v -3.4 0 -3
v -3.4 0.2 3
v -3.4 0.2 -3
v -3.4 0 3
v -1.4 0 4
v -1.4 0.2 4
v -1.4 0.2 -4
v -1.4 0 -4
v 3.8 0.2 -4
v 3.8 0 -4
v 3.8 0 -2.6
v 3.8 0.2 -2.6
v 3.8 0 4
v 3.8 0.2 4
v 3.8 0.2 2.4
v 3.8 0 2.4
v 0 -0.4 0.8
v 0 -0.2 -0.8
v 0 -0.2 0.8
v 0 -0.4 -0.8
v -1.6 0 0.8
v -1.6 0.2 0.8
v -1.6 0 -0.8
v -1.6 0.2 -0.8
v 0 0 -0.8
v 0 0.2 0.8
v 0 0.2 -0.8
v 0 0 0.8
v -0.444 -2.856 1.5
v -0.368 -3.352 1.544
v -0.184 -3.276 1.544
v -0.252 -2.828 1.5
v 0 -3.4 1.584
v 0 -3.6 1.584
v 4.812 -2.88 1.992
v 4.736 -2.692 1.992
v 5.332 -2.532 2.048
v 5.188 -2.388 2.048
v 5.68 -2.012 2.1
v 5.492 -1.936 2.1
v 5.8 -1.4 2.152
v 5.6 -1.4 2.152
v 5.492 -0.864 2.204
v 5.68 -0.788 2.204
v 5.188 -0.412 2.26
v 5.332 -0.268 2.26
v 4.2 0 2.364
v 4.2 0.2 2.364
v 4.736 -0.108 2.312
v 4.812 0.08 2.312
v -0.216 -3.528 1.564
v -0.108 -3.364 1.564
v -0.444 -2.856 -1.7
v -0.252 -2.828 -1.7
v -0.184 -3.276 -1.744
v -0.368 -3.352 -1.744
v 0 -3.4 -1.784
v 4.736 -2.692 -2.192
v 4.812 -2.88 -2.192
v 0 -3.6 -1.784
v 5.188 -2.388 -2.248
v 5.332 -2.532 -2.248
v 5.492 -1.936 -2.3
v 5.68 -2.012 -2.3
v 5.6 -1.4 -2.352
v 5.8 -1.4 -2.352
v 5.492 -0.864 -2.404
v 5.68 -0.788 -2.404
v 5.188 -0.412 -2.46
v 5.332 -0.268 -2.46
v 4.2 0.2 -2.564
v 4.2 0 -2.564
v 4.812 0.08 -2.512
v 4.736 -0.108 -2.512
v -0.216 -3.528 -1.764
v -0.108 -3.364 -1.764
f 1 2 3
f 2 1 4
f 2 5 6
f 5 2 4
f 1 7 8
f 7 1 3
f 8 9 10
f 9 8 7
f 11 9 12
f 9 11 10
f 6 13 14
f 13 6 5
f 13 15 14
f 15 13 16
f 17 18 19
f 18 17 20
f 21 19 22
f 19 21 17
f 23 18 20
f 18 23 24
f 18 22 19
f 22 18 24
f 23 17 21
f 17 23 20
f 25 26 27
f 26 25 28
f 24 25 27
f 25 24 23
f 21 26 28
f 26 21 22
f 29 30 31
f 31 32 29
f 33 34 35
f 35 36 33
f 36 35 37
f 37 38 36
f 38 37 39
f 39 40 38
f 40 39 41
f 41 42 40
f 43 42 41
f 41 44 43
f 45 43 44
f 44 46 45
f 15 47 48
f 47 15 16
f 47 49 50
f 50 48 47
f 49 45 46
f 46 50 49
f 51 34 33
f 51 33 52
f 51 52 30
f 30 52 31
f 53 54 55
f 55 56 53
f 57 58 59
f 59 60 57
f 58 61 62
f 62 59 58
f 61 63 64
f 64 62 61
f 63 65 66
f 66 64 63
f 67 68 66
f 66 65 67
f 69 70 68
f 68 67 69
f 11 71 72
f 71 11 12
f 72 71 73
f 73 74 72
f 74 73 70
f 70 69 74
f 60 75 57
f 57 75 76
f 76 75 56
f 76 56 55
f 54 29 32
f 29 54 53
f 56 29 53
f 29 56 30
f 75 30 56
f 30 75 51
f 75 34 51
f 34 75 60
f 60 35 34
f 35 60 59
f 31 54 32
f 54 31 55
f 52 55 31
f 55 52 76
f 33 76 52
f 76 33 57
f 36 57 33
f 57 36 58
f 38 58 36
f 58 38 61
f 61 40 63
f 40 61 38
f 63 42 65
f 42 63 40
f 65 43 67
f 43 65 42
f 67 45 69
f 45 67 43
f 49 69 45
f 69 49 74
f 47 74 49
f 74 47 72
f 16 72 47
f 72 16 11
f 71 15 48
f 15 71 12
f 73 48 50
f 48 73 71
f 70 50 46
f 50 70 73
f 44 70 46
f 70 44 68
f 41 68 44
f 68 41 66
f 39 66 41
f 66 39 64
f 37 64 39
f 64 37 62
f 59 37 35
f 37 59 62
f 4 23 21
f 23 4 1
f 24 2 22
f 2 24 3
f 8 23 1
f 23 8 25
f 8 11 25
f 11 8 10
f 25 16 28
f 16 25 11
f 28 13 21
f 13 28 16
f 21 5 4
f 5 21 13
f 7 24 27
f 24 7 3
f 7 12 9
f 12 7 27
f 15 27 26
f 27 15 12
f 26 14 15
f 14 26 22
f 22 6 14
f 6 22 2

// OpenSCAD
// file: ../p/rect.scad
use <../lib.scad>
function ldraw_lib__rect() = [
// 0 Rectangle
// 0 Name: rect.dat
// 0 Author: James Jessiman
// 0 !LDRAW_ORG Primitive UPDATE 2010-01
// 0 !LICENSE Licensed under CC BY 4.0 : see CAreadme.txt
// 
// 0 BFC CERTIFY CCW
  [0,"BFC","CERTIFY"],
  [0,"BFC","CCW"],
// 
// 0 !HISTORY 2002-04-05 [hafhead] Added BFC statement
// 0 !HISTORY 2002-04-25 [PTadmin] Official Update 2002-02
// 0 !HISTORY 2007-06-24 [PTadmin] Header formatted for Contributor Agreement
// 0 !HISTORY 2008-07-01 [PTadmin] Official Update 2008-01
// 0 !HISTORY 2010-01-17 [mikeheide] changed winding to CCW
// 0 !HISTORY 2010-04-05 [PTadmin] Official Update 2010-01
// 
// 
// 2 24 1 0 1 -1 0 1
  [2,24,1,0,1,-1,0,1],
// 2 24 -1 0 1 -1 0 -1
  [2,24,-1,0,1,-1,0,-1],
// 2 24 -1 0 -1 1 0 -1
  [2,24,-1,0,-1,1,0,-1],
// 2 24 1 0 -1 1 0 1
  [2,24,1,0,-1,1,0,1],
// 4 16 -1 0 1 -1 0 -1 1 0 -1 1 0 1
  [4,16,-1,0,1,-1,0,-1,1,0,-1,1,0,1],
// 0
];
module ldraw_lib__rect(step=0, col=false, unit=2/5, alt=false, line=0.2, solid=!$preview)
    makepoly(ldraw_lib__rect(), step=step, col=col, unit=unit, alt=alt, line=line, solid=solid);
ldraw_lib__rect(line=0.2);
// file: ../p/box5-2p.scad
use <../lib.scad>
function ldraw_lib__box5_2p() = [
// 0 Box with  5 Faces without  2 Parallel Edges
// 0 Name: box5-2p.dat
// 0 Author: Willy Tschager [Holly-Wood]
// 0 !LDRAW_ORG Primitive UPDATE 2024-01
// 0 !LICENSE Licensed under CC BY 4.0 : see CAreadme.txt
// 
// 0 BFC CERTIFY CCW
  [0,"BFC","CERTIFY"],
  [0,"BFC","CCW"],
// 
// 0 !HISTORY 2012-03-30 [PTadmin] Official Update 2012-01
// 0 !HISTORY 2024-01-04 [Holly-Wood] Complete re-write, original by Brickaneer
// 0 !HISTORY 2024-01-29 [OrionP] Official Update 2024-01
// 
// 2 24 -1 1 1 1 1 1
  [2,24,-1,1,1,1,1,1],
// 2 24 -1 1 -1 -1 1 1
  [2,24,-1,1,-1,-1,1,1],
// 2 24 1 1 -1 -1 1 -1
  [2,24,1,1,-1,-1,1,-1],
// 2 24 1 1 1 1 1 -1
  [2,24,1,1,1,1,1,-1],
// 4 16 1 1 1 1 1 -1 -1 1 -1 -1 1 1
  [4,16,1,1,1,1,1,-1,-1,1,-1,-1,1,1],
// 
// 2 24 -1 1 1 -1 0 1
  [2,24,-1,1,1,-1,0,1],
// 2 24 -1 1 -1 -1 0 -1
  [2,24,-1,1,-1,-1,0,-1],
// 2 24 -1 0 -1 -1 0 1
  [2,24,-1,0,-1,-1,0,1],
// 4 16 -1 1 1 -1 1 -1 -1 0 -1 -1 0 1
  [4,16,-1,1,1,-1,1,-1,-1,0,-1,-1,0,1],
// 
// 2 24 1 1 1 1 0 1
  [2,24,1,1,1,1,0,1],
// 2 24 1 1 -1 1 0 -1
  [2,24,1,1,-1,1,0,-1],
// 2 24 1 0 1 1 0 -1
  [2,24,1,0,1,1,0,-1],
// 4 16 1 1 -1 1 1 1 1 0 1 1 0 -1
  [4,16,1,1,-1,1,1,1,1,0,1,1,0,-1],
// 
// 4 16 1 1 1 -1 1 1 -1 0 1 1 0 1
  [4,16,1,1,1,-1,1,1,-1,0,1,1,0,1],
// 4 16 -1 1 -1 1 1 -1 1 0 -1 -1 0 -1
  [4,16,-1,1,-1,1,1,-1,1,0,-1,-1,0,-1],
];
module ldraw_lib__box5_2p(step=0, col=false, unit=2/5, alt=false, line=0.2, solid=!$preview)
    makepoly(ldraw_lib__box5_2p(), step=step, col=col, unit=unit, alt=alt, line=line, solid=solid);
ldraw_lib__box5_2p(line=0.2);
// file: ../p/box3u4a.scad
use <../lib.scad>
function ldraw_lib__box3u4a() = [
// 0 Box with 3 Faces without 4 Adjacent Edges
// 0 Name: box3u4a.dat
// 0 Author: Niels Karsdorp [nielsk]
// 0 !LDRAW_ORG Primitive UPDATE 2009-01
// 0 !LICENSE Licensed under CC BY 4.0 : see CAreadme.txt
// 
// 0 BFC CERTIFY CCW
  [0,"BFC","CERTIFY"],
  [0,"BFC","CCW"],
// 
// 0 !HISTORY 2009-05-02 [PTadmin] Official Update 2009-01
// 
// 
// 2 24 1 1 1 -1 1 1
  [2,24,1,1,1,-1,1,1],
// 2 24 -1 1 -1 1 1 -1
  [2,24,-1,1,-1,1,1,-1],
// 2 24 1 1 1 1 1 -1
  [2,24,1,1,1,1,1,-1],
// 2 24 -1 1 1 -1 1 -1
  [2,24,-1,1,1,-1,1,-1],
// 2 24 1 1 1 1 0 1
  [2,24,1,1,1,1,0,1],
// 2 24 1 1 -1 1 0 -1
  [2,24,1,1,-1,1,0,-1],
// 2 24 -1 1 1 -1 0 1
  [2,24,-1,1,1,-1,0,1],
// 2 24 -1 1 -1 -1 0 -1
  [2,24,-1,1,-1,-1,0,-1],
// 4 16 -1 1 -1 -1 1 1 1 1 1 1 1 -1
  [4,16,-1,1,-1,-1,1,1,1,1,1,1,1,-1],
// 4 16 -1 1 1 -1 0 1 1 0 1 1 1 1
  [4,16,-1,1,1,-1,0,1,1,0,1,1,1,1],
// 4 16 1 1 -1 1 0 -1 -1 0 -1 -1 1 -1
  [4,16,1,1,-1,1,0,-1,-1,0,-1,-1,1,-1],
// 0
];
module ldraw_lib__box3u4a(step=0, col=false, unit=2/5, alt=false, line=0.2, solid=!$preview)
    makepoly(ldraw_lib__box3u4a(), step=step, col=col, unit=unit, alt=alt, line=line, solid=solid);
ldraw_lib__box3u4a(line=0.2);
// file: ../p/box2-5.scad
use <../lib.scad>
function ldraw_lib__box2_5() = [
// 0 Box with 2 Faces without 5 Edges
// 0 Name: box2-5.dat
// 0 Author: Steffen [Steffen]
// 0 !LDRAW_ORG Primitive UPDATE 2003-03
// 0 !LICENSE Licensed under CC BY 4.0 : see CAreadme.txt
// 
// 0 BFC CERTIFY CCW
  [0,"BFC","CERTIFY"],
  [0,"BFC","CCW"],
// 
// 0 !HISTORY 2003-12-19 [PTadmin] Official Update 2003-03
// 0 !HISTORY 2007-06-24 [PTadmin] Header formatted for Contributor Agreement
// 0 !HISTORY 2008-07-01 [PTadmin] Official Update 2008-01
// 
// 
// 2 24 1 1 1 -1 1 1
  [2,24,1,1,1,-1,1,1],
// 2 24 1 1 -1 -1 1 -1
  [2,24,1,1,-1,-1,1,-1],
// 2 24 1 -1 1 -1 -1 1
  [2,24,1,-1,1,-1,-1,1],
// 2 24 -1 -1 1 -1 1 1
  [2,24,-1,-1,1,-1,1,1],
// 2 24 1 -1 1 1 1 1
  [2,24,1,-1,1,1,1,1],
// 2 24 -1 1 -1 -1 1 1
  [2,24,-1,1,-1,-1,1,1],
// 2 24 1 1 -1 1 1 1
  [2,24,1,1,-1,1,1,1],
// 4 16 1 1 1 1 1 -1 -1 1 -1 -1 1 1
  [4,16,1,1,1,1,1,-1,-1,1,-1,-1,1,1],
// 4 16 1 1 1 -1 1 1 -1 -1 1 1 -1 1
  [4,16,1,1,1,-1,1,1,-1,-1,1,1,-1,1],
// 0
];
module ldraw_lib__box2_5(step=0, col=false, unit=2/5, alt=false, line=0.2, solid=!$preview)
    makepoly(ldraw_lib__box2_5(), step=step, col=col, unit=unit, alt=alt, line=line, solid=solid);
ldraw_lib__box2_5(line=0.2);
// main file
use <../lib.scad>
use <../p/box2-5.scad>
use <../p/box3u4a.scad>
use <../p/box5-2p.scad>
use <../p/rect.scad>
function ldraw_lib__u9642() = [
// 0 ~Electric 9V Battery Box  4 x 14 x  4 Bottom - Contact Short
// 0 Name: u9642.dat
// 0 Author: Gerald Lasser [GeraldLasser]
// 0 !LDRAW_ORG Part UPDATE 2024-08
// 0 !LICENSE Licensed under CC BY 4.0 : see CAreadme.txt
// 
// 0 BFC CERTIFY CCW
  [0,"BFC","CERTIFY"],
  [0,"BFC","CCW"],
// 
// 0 !HISTORY 2024-09-30 [OrionP] Official Update 2024-08
// 
// 1 16 -8.5 0 .25 0 1 0 0 0 7.5 .25 0 0 rect.dat
  [1,16,-8.5,0,.25,0,1,0,0,0,7.5,.25,0,0, ldraw_lib__rect()],
// 4 16 -3.5 -10 0 -3.5 -10 .5 -8.5 -7.5 .5 -8.5 -7.5 0
  [4,16,-3.5,-10,0,-3.5,-10,.5,-8.5,-7.5,.5,-8.5,-7.5,0],
// 4 16 -8.5 7.5 .5 -3.5 10 .5 -3.5 10 0 -8.5 7.5 0
  [4,16,-8.5,7.5,.5,-3.5,10,.5,-3.5,10,0,-8.5,7.5,0],
// 2 24 -3.5 -10 0 -8.5 -7.5 0
  [2,24,-3.5,-10,0,-8.5,-7.5,0],
// 2 24 -8.5 -7.5 .5 -3.5 -10 .5
  [2,24,-8.5,-7.5,.5,-3.5,-10,.5],
// 2 24 -8.5 7.5 .5 -3.5 10 .5
  [2,24,-8.5,7.5,.5,-3.5,10,.5],
// 2 24 -3.5 10 0 -8.5 7.5 0
  [2,24,-3.5,10,0,-8.5,7.5,0],
// 1 16 3 8.25 .25 0 0 6.5 0 1.75 0 -.25 0 0 box2-5.dat
  [1,16,3,8.25,.25,0,0,6.5,0,1.75,0,-.25,0,0, ldraw_lib__box2_5()],
// 1 16 3 -8 .25 0 0 6.5 0 -2 0 -.25 0 0 box2-5.dat
  [1,16,3,-8,.25,0,0,6.5,0,-2,0,-.25,0,0, ldraw_lib__box2_5()],
// 
// 1 16 -4 0 .25 0 4 0 2 0 0 0 -1 .25 box5-2p.dat
  [1,16,-4,0,.25,0,4,0,2,0,0,0,-1,.25, ldraw_lib__box5_2p()],
// 0 BFC INVERTNEXT
  [0,"BFC","INVERTNEXT"],
// 1 16 -4 0 .25 0 4 0 0 0 2 -.25 0 0 box3u4a.dat
  [1,16,-4,0,.25,0,4,0,0,0,2,-.25,0,0, ldraw_lib__box3u4a()],
// 5 24 -4 2 .5 -4 -2 .5 -8.5 -7.5 .5 0 -2 -.5
  [5,24,-4,2,.5,-4,-2,.5,-8.5,-7.5,.5,0,-2,-.5],
// 5 24 -4 2 0 -4 -2 0 0 -2 -1 -8.5 -7.5 0
  [5,24,-4,2,0,-4,-2,0,0,-2,-1,-8.5,-7.5,0],
// 
// 2 24 10.5 -5.91 0 9.5 -6 0
  [2,24,10.5,-5.91,0,9.5,-6,0],
// 2 24 9.5 -6 .5 10.5 -5.91 .5
  [2,24,9.5,-6,.5,10.5,-5.91,.5],
// 2 24 0 -3.96 -8.5 11.84 -4.98 -6.73
  [2,24,0,-3.96,-8.5,11.84,-4.98,-6.73],
// 2 24 -.46 -3.86 -8.19 -.63 -3.75 -7.07
  [2,24,-.46,-3.86,-8.19,-.63,-3.75,-7.07],
// 2 24 -.63 -3.75 -7.07 -1.11 -3.75 -7.14
  [2,24,-.63,-3.75,-7.07,-1.11,-3.75,-7.14],
// 2 24 -.46 -3.86 -8.19 -.27 -3.91 -8.41
  [2,24,-.46,-3.86,-8.19,-.27,-3.91,-8.41],
// 2 24 -.27 -3.91 -8.41 0 -3.96 -8.5
  [2,24,-.27,-3.91,-8.41,0,-3.96,-8.5],
// 2 24 14.2 -5.25 -5.03 14.5 -5.38 -3.5
  [2,24,14.2,-5.25,-5.03,14.5,-5.38,-3.5],
// 2 24 13.33 -5.12 -6.33 14.2 -5.25 -5.03
  [2,24,13.33,-5.12,-6.33,14.2,-5.25,-5.03],
// 2 24 12.03 -4.98 -7.2 13.33 -5.12 -6.33
  [2,24,12.03,-4.98,-7.2,13.33,-5.12,-6.33],
// 2 24 12.03 -5.78 .2 10.5 -5.91 .5
  [2,24,12.03,-5.78,.2,10.5,-5.91,.5],
// 2 24 13.33 -5.65 -.67 12.03 -5.78 .2
  [2,24,13.33,-5.65,-.67,12.03,-5.78,.2],
// 2 24 14.2 -5.51 -1.97 13.33 -5.65 -.67
  [2,24,14.2,-5.51,-1.97,13.33,-5.65,-.67],
// 2 24 14.5 -5.38 -3.5 14.2 -5.51 -1.97
  [2,24,14.5,-5.38,-3.5,14.2,-5.51,-1.97],
// 2 24 -1.11 -3.75 -7.14 -.92 -3.86 -8.38
  [2,24,-1.11,-3.75,-7.14,-.92,-3.86,-8.38],
// 2 24 12.03 -4.98 -7.2 0 -3.96 -9
  [2,24,12.03,-4.98,-7.2,0,-3.96,-9],
// 2 24 -.92 -3.86 -8.38 -.54 -3.91 -8.82
  [2,24,-.92,-3.86,-8.38,-.54,-3.91,-8.82],
// 2 24 -.54 -3.91 -8.82 0 -3.96 -9
  [2,24,-.54,-3.91,-8.82,0,-3.96,-9],
// 2 24 11.84 -5.78 -.27 10.5 -5.91 0
  [2,24,11.84,-5.78,-.27,10.5,-5.91,0],
// 2 24 12.97 -5.65 -1.03 11.84 -5.78 -.27
  [2,24,12.97,-5.65,-1.03,11.84,-5.78,-.27],
// 2 24 13.73 -5.51 -2.16 12.97 -5.65 -1.03
  [2,24,13.73,-5.51,-2.16,12.97,-5.65,-1.03],
// 2 24 14 -5.38 -3.5 13.73 -5.51 -2.16
  [2,24,14,-5.38,-3.5,13.73,-5.51,-2.16],
// 2 24 13.73 -5.25 -4.84 14 -5.38 -3.5
  [2,24,13.73,-5.25,-4.84,14,-5.38,-3.5],
// 2 24 12.97 -5.12 -5.97 13.73 -5.25 -4.84
  [2,24,12.97,-5.12,-5.97,13.73,-5.25,-4.84],
// 2 24 11.84 -4.98 -6.73 12.97 -5.12 -5.97
  [2,24,11.84,-4.98,-6.73,12.97,-5.12,-5.97],
// 3 16 -1.11 -3.75 -7.14 -.92 -3.86 -8.38 -.46 -3.86 -8.19
  [3,16,-1.11,-3.75,-7.14,-.92,-3.86,-8.38,-.46,-3.86,-8.19],
// 3 16 -.46 -3.86 -8.19 -.63 -3.75 -7.07 -1.11 -3.75 -7.14
  [3,16,-.46,-3.86,-8.19,-.63,-3.75,-7.07,-1.11,-3.75,-7.14],
// 5 24 -.46 -3.86 -8.19 -1.11 -3.75 -7.14 -.63 -3.75 -7.07 -.92 -3.86 -8.38
  [5,24,-.46,-3.86,-8.19,-1.11,-3.75,-7.14,-.63,-3.75,-7.07,-.92,-3.86,-8.38],
// 3 16 0 -3.96 -8.5 0 -3.96 -9 12.03 -4.98 -7.2
  [3,16,0,-3.96,-8.5,0,-3.96,-9,12.03,-4.98,-7.2],
// 3 16 12.03 -4.98 -7.2 11.84 -4.98 -6.73 0 -3.96 -8.5
  [3,16,12.03,-4.98,-7.2,11.84,-4.98,-6.73,0,-3.96,-8.5],
// 5 24 12.03 -4.98 -7.2 0 -3.96 -8.5 11.84 -4.98 -6.73 0 -3.96 -9
  [5,24,12.03,-4.98,-7.2,0,-3.96,-8.5,11.84,-4.98,-6.73,0,-3.96,-9],
// 3 16 11.84 -4.98 -6.73 12.03 -4.98 -7.2 13.33 -5.12 -6.33
  [3,16,11.84,-4.98,-6.73,12.03,-4.98,-7.2,13.33,-5.12,-6.33],
// 3 16 13.33 -5.12 -6.33 12.97 -5.12 -5.97 11.84 -4.98 -6.73
  [3,16,13.33,-5.12,-6.33,12.97,-5.12,-5.97,11.84,-4.98,-6.73],
// 5 24 13.33 -5.12 -6.33 11.84 -4.98 -6.73 12.97 -5.12 -5.97 12.03 -4.98 -7.2
  [5,24,13.33,-5.12,-6.33,11.84,-4.98,-6.73,12.97,-5.12,-5.97,12.03,-4.98,-7.2],
// 3 16 12.97 -5.12 -5.97 13.33 -5.12 -6.33 14.2 -5.25 -5.03
  [3,16,12.97,-5.12,-5.97,13.33,-5.12,-6.33,14.2,-5.25,-5.03],
// 3 16 14.2 -5.25 -5.03 13.73 -5.25 -4.84 12.97 -5.12 -5.97
  [3,16,14.2,-5.25,-5.03,13.73,-5.25,-4.84,12.97,-5.12,-5.97],
// 5 24 14.2 -5.25 -5.03 12.97 -5.12 -5.97 13.73 -5.25 -4.84 13.33 -5.12 -6.33
  [5,24,14.2,-5.25,-5.03,12.97,-5.12,-5.97,13.73,-5.25,-4.84,13.33,-5.12,-6.33],
// 3 16 13.73 -5.25 -4.84 14.2 -5.25 -5.03 14.5 -5.38 -3.5
  [3,16,13.73,-5.25,-4.84,14.2,-5.25,-5.03,14.5,-5.38,-3.5],
// 3 16 14.5 -5.38 -3.5 14 -5.38 -3.5 13.73 -5.25 -4.84
  [3,16,14.5,-5.38,-3.5,14,-5.38,-3.5,13.73,-5.25,-4.84],
// 5 24 14.5 -5.38 -3.5 13.73 -5.25 -4.84 14 -5.38 -3.5 14.2 -5.25 -5.03
  [5,24,14.5,-5.38,-3.5,13.73,-5.25,-4.84,14,-5.38,-3.5,14.2,-5.25,-5.03],
// 3 16 13.73 -5.51 -2.16 14 -5.38 -3.5 14.5 -5.38 -3.5
  [3,16,13.73,-5.51,-2.16,14,-5.38,-3.5,14.5,-5.38,-3.5],
// 3 16 14.5 -5.38 -3.5 14.2 -5.51 -1.97 13.73 -5.51 -2.16
  [3,16,14.5,-5.38,-3.5,14.2,-5.51,-1.97,13.73,-5.51,-2.16],
// 5 24 14.5 -5.38 -3.5 13.73 -5.51 -2.16 14.2 -5.51 -1.97 14 -5.38 -3.5
  [5,24,14.5,-5.38,-3.5,13.73,-5.51,-2.16,14.2,-5.51,-1.97,14,-5.38,-3.5],
// 3 16 12.97 -5.65 -1.03 13.73 -5.51 -2.16 14.2 -5.51 -1.97
  [3,16,12.97,-5.65,-1.03,13.73,-5.51,-2.16,14.2,-5.51,-1.97],
// 3 16 14.2 -5.51 -1.97 13.33 -5.65 -.67 12.97 -5.65 -1.03
  [3,16,14.2,-5.51,-1.97,13.33,-5.65,-.67,12.97,-5.65,-1.03],
// 5 24 14.2 -5.51 -1.97 12.97 -5.65 -1.03 13.33 -5.65 -.67 13.73 -5.51 -2.16
  [5,24,14.2,-5.51,-1.97,12.97,-5.65,-1.03,13.33,-5.65,-.67,13.73,-5.51,-2.16],
// 4 16 9.5 -6 .5 9.5 -6 0 10.5 -5.91 0 10.5 -5.91 .5
  [4,16,9.5,-6,.5,9.5,-6,0,10.5,-5.91,0,10.5,-5.91,.5],
// 3 16 10.5 -5.91 0 11.84 -5.78 -.27 12.03 -5.78 .2
  [3,16,10.5,-5.91,0,11.84,-5.78,-.27,12.03,-5.78,.2],
// 3 16 12.03 -5.78 .2 10.5 -5.91 .5 10.5 -5.91 0
  [3,16,12.03,-5.78,.2,10.5,-5.91,.5,10.5,-5.91,0],
// 5 24 12.03 -5.78 .2 10.5 -5.91 0 10.5 -5.91 .5 11.84 -5.78 -.27
  [5,24,12.03,-5.78,.2,10.5,-5.91,0,10.5,-5.91,.5,11.84,-5.78,-.27],
// 3 16 11.84 -5.78 -.27 12.97 -5.65 -1.03 13.33 -5.65 -.67
  [3,16,11.84,-5.78,-.27,12.97,-5.65,-1.03,13.33,-5.65,-.67],
// 3 16 13.33 -5.65 -.67 12.03 -5.78 .2 11.84 -5.78 -.27
  [3,16,13.33,-5.65,-.67,12.03,-5.78,.2,11.84,-5.78,-.27],
// 5 24 13.33 -5.65 -.67 11.84 -5.78 -.27 12.03 -5.78 .2 12.97 -5.65 -1.03
  [5,24,13.33,-5.65,-.67,11.84,-5.78,-.27,12.03,-5.78,.2,12.97,-5.65,-1.03],
// 3 16 -.54 -3.91 -8.82 0 -3.96 -9 0 -3.96 -8.5
  [3,16,-.54,-3.91,-8.82,0,-3.96,-9,0,-3.96,-8.5],
// 3 16 -.54 -3.91 -8.82 0 -3.96 -8.5 -.27 -3.91 -8.41
  [3,16,-.54,-3.91,-8.82,0,-3.96,-8.5,-.27,-3.91,-8.41],
// 3 16 -.54 -3.91 -8.82 -.27 -3.91 -8.41 -.92 -3.86 -8.38
  [3,16,-.54,-3.91,-8.82,-.27,-3.91,-8.41,-.92,-3.86,-8.38],
// 3 16 -.92 -3.86 -8.38 -.27 -3.91 -8.41 -.46 -3.86 -8.19
  [3,16,-.92,-3.86,-8.38,-.27,-3.91,-8.41,-.46,-3.86,-8.19],
// 2 24 9.5 6.5 0 10.5 6.41 0
  [2,24,9.5,6.5,0,10.5,6.41,0],
// 2 24 10.5 6.41 .5 9.5 6.5 .5
  [2,24,10.5,6.41,.5,9.5,6.5,.5],
// 2 24 11.84 5.48 -6.73 0 4.46 -8.5
  [2,24,11.84,5.48,-6.73,0,4.46,-8.5],
// 2 24 -.63 4.25 -7.07 -.46 4.36 -8.19
  [2,24,-.63,4.25,-7.07,-.46,4.36,-8.19],
// 2 24 -1.11 4.25 -7.14 -.63 4.25 -7.07
  [2,24,-1.11,4.25,-7.14,-.63,4.25,-7.07],
// 2 24 -.27 4.41 -8.41 -.46 4.36 -8.19
  [2,24,-.27,4.41,-8.41,-.46,4.36,-8.19],
// 2 24 0 4.46 -8.5 -.27 4.41 -8.41
  [2,24,0,4.46,-8.5,-.27,4.41,-8.41],
// 2 24 14.5 5.88 -3.5 14.2 5.75 -5.03
  [2,24,14.5,5.88,-3.5,14.2,5.75,-5.03],
// 2 24 14.2 5.75 -5.03 13.33 5.62 -6.33
  [2,24,14.2,5.75,-5.03,13.33,5.62,-6.33],
// 2 24 13.33 5.62 -6.33 12.03 5.48 -7.2
  [2,24,13.33,5.62,-6.33,12.03,5.48,-7.2],
// 2 24 10.5 6.41 .5 12.03 6.28 .2
  [2,24,10.5,6.41,.5,12.03,6.28,.2],
// 2 24 12.03 6.28 .2 13.33 6.15 -.67
  [2,24,12.03,6.28,.2,13.33,6.15,-.67],
// 2 24 13.33 6.15 -.67 14.2 6.01 -1.97
  [2,24,13.33,6.15,-.67,14.2,6.01,-1.97],
// 2 24 14.2 6.01 -1.97 14.5 5.88 -3.5
  [2,24,14.2,6.01,-1.97,14.5,5.88,-3.5],
// 2 24 -.92 4.36 -8.38 -1.11 4.25 -7.14
  [2,24,-.92,4.36,-8.38,-1.11,4.25,-7.14],
// 2 24 0 4.46 -9 12.03 5.48 -7.2
  [2,24,0,4.46,-9,12.03,5.48,-7.2],
// 2 24 -.54 4.41 -8.82 -.92 4.36 -8.38
  [2,24,-.54,4.41,-8.82,-.92,4.36,-8.38],
// 2 24 0 4.46 -9 -.54 4.41 -8.82
  [2,24,0,4.46,-9,-.54,4.41,-8.82],
// 2 24 10.5 6.41 0 11.84 6.28 -.27
  [2,24,10.5,6.41,0,11.84,6.28,-.27],
// 2 24 11.84 6.28 -.27 12.97 6.15 -1.03
  [2,24,11.84,6.28,-.27,12.97,6.15,-1.03],
// 2 24 12.97 6.15 -1.03 13.73 6.01 -2.16
  [2,24,12.97,6.15,-1.03,13.73,6.01,-2.16],
// 2 24 13.73 6.01 -2.16 14 5.88 -3.5
  [2,24,13.73,6.01,-2.16,14,5.88,-3.5],
// 2 24 14 5.88 -3.5 13.73 5.75 -4.84
  [2,24,14,5.88,-3.5,13.73,5.75,-4.84],
// 2 24 13.73 5.75 -4.84 12.97 5.62 -5.97
  [2,24,13.73,5.75,-4.84,12.97,5.62,-5.97],
// 2 24 12.97 5.62 -5.97 11.84 5.48 -6.73
  [2,24,12.97,5.62,-5.97,11.84,5.48,-6.73],
// 3 16 -1.11 4.25 -7.14 -.63 4.25 -7.07 -.46 4.36 -8.19
  [3,16,-1.11,4.25,-7.14,-.63,4.25,-7.07,-.46,4.36,-8.19],
// 3 16 -.46 4.36 -8.19 -.92 4.36 -8.38 -1.11 4.25 -7.14
  [3,16,-.46,4.36,-8.19,-.92,4.36,-8.38,-1.11,4.25,-7.14],
// 5 24 -.46 4.36 -8.19 -1.11 4.25 -7.14 -.92 4.36 -8.38 -.63 4.25 -7.07
  [5,24,-.46,4.36,-8.19,-1.11,4.25,-7.14,-.92,4.36,-8.38,-.63,4.25,-7.07],
// 3 16 0 4.46 -8.5 11.84 5.48 -6.73 12.03 5.48 -7.2
  [3,16,0,4.46,-8.5,11.84,5.48,-6.73,12.03,5.48,-7.2],
// 3 16 12.03 5.48 -7.2 0 4.46 -9 0 4.46 -8.5
  [3,16,12.03,5.48,-7.2,0,4.46,-9,0,4.46,-8.5],
// 5 24 12.03 5.48 -7.2 0 4.46 -8.5 0 4.46 -9 11.84 5.48 -6.73
  [5,24,12.03,5.48,-7.2,0,4.46,-8.5,0,4.46,-9,11.84,5.48,-6.73],
// 3 16 11.84 5.48 -6.73 12.97 5.62 -5.97 13.33 5.62 -6.33
  [3,16,11.84,5.48,-6.73,12.97,5.62,-5.97,13.33,5.62,-6.33],
// 3 16 13.33 5.62 -6.33 12.03 5.48 -7.2 11.84 5.48 -6.73
  [3,16,13.33,5.62,-6.33,12.03,5.48,-7.2,11.84,5.48,-6.73],
// 5 24 13.33 5.62 -6.33 11.84 5.48 -6.73 12.03 5.48 -7.2 12.97 5.62 -5.97
  [5,24,13.33,5.62,-6.33,11.84,5.48,-6.73,12.03,5.48,-7.2,12.97,5.62,-5.97],
// 3 16 12.97 5.62 -5.97 13.73 5.75 -4.84 14.2 5.75 -5.03
  [3,16,12.97,5.62,-5.97,13.73,5.75,-4.84,14.2,5.75,-5.03],
// 3 16 14.2 5.75 -5.03 13.33 5.62 -6.33 12.97 5.62 -5.97
  [3,16,14.2,5.75,-5.03,13.33,5.62,-6.33,12.97,5.62,-5.97],
// 5 24 14.2 5.75 -5.03 12.97 5.62 -5.97 13.33 5.62 -6.33 13.73 5.75 -4.84
  [5,24,14.2,5.75,-5.03,12.97,5.62,-5.97,13.33,5.62,-6.33,13.73,5.75,-4.84],
// 3 16 13.73 5.75 -4.84 14 5.88 -3.5 14.5 5.88 -3.5
  [3,16,13.73,5.75,-4.84,14,5.88,-3.5,14.5,5.88,-3.5],
// 3 16 14.5 5.88 -3.5 14.2 5.75 -5.03 13.73 5.75 -4.84
  [3,16,14.5,5.88,-3.5,14.2,5.75,-5.03,13.73,5.75,-4.84],
// 5 24 14.5 5.88 -3.5 13.73 5.75 -4.84 14.2 5.75 -5.03 14 5.88 -3.5
  [5,24,14.5,5.88,-3.5,13.73,5.75,-4.84,14.2,5.75,-5.03,14,5.88,-3.5],
// 3 16 13.73 6.01 -2.16 14.2 6.01 -1.97 14.5 5.88 -3.5
  [3,16,13.73,6.01,-2.16,14.2,6.01,-1.97,14.5,5.88,-3.5],
// 3 16 14.5 5.88 -3.5 14 5.88 -3.5 13.73 6.01 -2.16
  [3,16,14.5,5.88,-3.5,14,5.88,-3.5,13.73,6.01,-2.16],
// 5 24 14.5 5.88 -3.5 13.73 6.01 -2.16 14 5.88 -3.5 14.2 6.01 -1.97
  [5,24,14.5,5.88,-3.5,13.73,6.01,-2.16,14,5.88,-3.5,14.2,6.01,-1.97],
// 3 16 12.97 6.15 -1.03 13.33 6.15 -.67 14.2 6.01 -1.97
  [3,16,12.97,6.15,-1.03,13.33,6.15,-.67,14.2,6.01,-1.97],
// 3 16 14.2 6.01 -1.97 13.73 6.01 -2.16 12.97 6.15 -1.03
  [3,16,14.2,6.01,-1.97,13.73,6.01,-2.16,12.97,6.15,-1.03],
// 5 24 14.2 6.01 -1.97 12.97 6.15 -1.03 13.73 6.01 -2.16 13.33 6.15 -.67
  [5,24,14.2,6.01,-1.97,12.97,6.15,-1.03,13.73,6.01,-2.16,13.33,6.15,-.67],
// 4 16 10.5 6.41 0 9.5 6.5 0 9.5 6.5 .5 10.5 6.41 .5
  [4,16,10.5,6.41,0,9.5,6.5,0,9.5,6.5,.5,10.5,6.41,.5],
// 3 16 10.5 6.41 0 10.5 6.41 .5 12.03 6.28 .2
  [3,16,10.5,6.41,0,10.5,6.41,.5,12.03,6.28,.2],
// 3 16 12.03 6.28 .2 11.84 6.28 -.27 10.5 6.41 0
  [3,16,12.03,6.28,.2,11.84,6.28,-.27,10.5,6.41,0],
// 5 24 12.03 6.28 .2 10.5 6.41 0 11.84 6.28 -.27 10.5 6.41 .5
  [5,24,12.03,6.28,.2,10.5,6.41,0,11.84,6.28,-.27,10.5,6.41,.5],
// 3 16 11.84 6.28 -.27 12.03 6.28 .2 13.33 6.15 -.67
  [3,16,11.84,6.28,-.27,12.03,6.28,.2,13.33,6.15,-.67],
// 3 16 13.33 6.15 -.67 12.97 6.15 -1.03 11.84 6.28 -.27
  [3,16,13.33,6.15,-.67,12.97,6.15,-1.03,11.84,6.28,-.27],
// 5 24 13.33 6.15 -.67 11.84 6.28 -.27 12.97 6.15 -1.03 12.03 6.28 .2
  [5,24,13.33,6.15,-.67,11.84,6.28,-.27,12.97,6.15,-1.03,12.03,6.28,.2],
// 3 16 0 4.46 -9 -.54 4.41 -8.82 0 4.46 -8.5
  [3,16,0,4.46,-9,-.54,4.41,-8.82,0,4.46,-8.5],
// 3 16 0 4.46 -8.5 -.54 4.41 -8.82 -.27 4.41 -8.41
  [3,16,0,4.46,-8.5,-.54,4.41,-8.82,-.27,4.41,-8.41],
// 3 16 -.27 4.41 -8.41 -.54 4.41 -8.82 -.92 4.36 -8.38
  [3,16,-.27,4.41,-8.41,-.54,4.41,-8.82,-.92,4.36,-8.38],
// 3 16 -.27 4.41 -8.41 -.92 4.36 -8.38 -.46 4.36 -8.19
  [3,16,-.27,4.41,-8.41,-.92,4.36,-8.38,-.46,4.36,-8.19],
// 4 16 -.63 4.25 -7.07 -1.11 4.25 -7.14 -1.11 -3.75 -7.14 -.63 -3.75 -7.07
  [4,16,-.63,4.25,-7.07,-1.11,4.25,-7.14,-1.11,-3.75,-7.14,-.63,-3.75,-7.07],
// 4 16 -1.11 -3.75 -7.14 -1.11 4.25 -7.14 -.92 4.36 -8.38 -.92 -3.86 -8.38
  [4,16,-1.11,-3.75,-7.14,-1.11,4.25,-7.14,-.92,4.36,-8.38,-.92,-3.86,-8.38],
// 4 16 -.54 -3.91 -8.82 -.92 -3.86 -8.38 -.92 4.36 -8.38 -.54 4.41 -8.82
  [4,16,-.54,-3.91,-8.82,-.92,-3.86,-8.38,-.92,4.36,-8.38,-.54,4.41,-8.82],
// 4 16 -.54 -3.91 -8.82 -.54 4.41 -8.82 0 4.46 -9 0 -3.96 -9
  [4,16,-.54,-3.91,-8.82,-.54,4.41,-8.82,0,4.46,-9,0,-3.96,-9],
// 4 16 0 -3.96 -9 0 4.46 -9 12.03 5.48 -7.2 12.03 -4.98 -7.2
  [4,16,0,-3.96,-9,0,4.46,-9,12.03,5.48,-7.2,12.03,-4.98,-7.2],
// 4 16 -.63 4.25 -7.07 -.63 -3.75 -7.07 -.46 -3.86 -8.19 -.46 4.36 -8.19
  [4,16,-.63,4.25,-7.07,-.63,-3.75,-7.07,-.46,-3.86,-8.19,-.46,4.36,-8.19],
// 4 16 -.27 4.41 -8.41 -.46 4.36 -8.19 -.46 -3.86 -8.19 -.27 -3.91 -8.41
  [4,16,-.27,4.41,-8.41,-.46,4.36,-8.19,-.46,-3.86,-8.19,-.27,-3.91,-8.41],
// 4 16 -.27 4.41 -8.41 -.27 -3.91 -8.41 0 -3.96 -8.5 0 4.46 -8.5
  [4,16,-.27,4.41,-8.41,-.27,-3.91,-8.41,0,-3.96,-8.5,0,4.46,-8.5],
// 4 16 0 4.46 -8.5 0 -3.96 -8.5 11.84 -4.98 -6.73 11.84 5.48 -6.73
  [4,16,0,4.46,-8.5,0,-3.96,-8.5,11.84,-4.98,-6.73,11.84,5.48,-6.73],
// 4 16 12.97 -5.12 -5.97 12.97 5.62 -5.97 11.84 5.48 -6.73 11.84 -4.98 -6.73
  [4,16,12.97,-5.12,-5.97,12.97,5.62,-5.97,11.84,5.48,-6.73,11.84,-4.98,-6.73],
// 4 16 12.97 5.62 -5.97 12.97 -5.12 -5.97 13.73 -5.25 -4.84 13.73 5.75 -4.84
  [4,16,12.97,5.62,-5.97,12.97,-5.12,-5.97,13.73,-5.25,-4.84,13.73,5.75,-4.84],
// 4 16 13.73 5.75 -4.84 13.73 -5.25 -4.84 14 -5.38 -3.5 14 5.88 -3.5
  [4,16,13.73,5.75,-4.84,13.73,-5.25,-4.84,14,-5.38,-3.5,14,5.88,-3.5],
// 4 16 14 5.88 -3.5 14 -5.38 -3.5 13.73 -5.51 -2.16 13.73 6.01 -2.16
  [4,16,14,5.88,-3.5,14,-5.38,-3.5,13.73,-5.51,-2.16,13.73,6.01,-2.16],
// 4 16 13.73 6.01 -2.16 13.73 -5.51 -2.16 12.97 -5.65 -1.03 12.97 6.15 -1.03
  [4,16,13.73,6.01,-2.16,13.73,-5.51,-2.16,12.97,-5.65,-1.03,12.97,6.15,-1.03],
// 4 16 12.97 6.15 -1.03 12.97 -5.65 -1.03 11.84 -5.78 -.27 11.84 6.28 -.27
  [4,16,12.97,6.15,-1.03,12.97,-5.65,-1.03,11.84,-5.78,-.27,11.84,6.28,-.27],
// 4 16 11.84 6.28 -.27 11.84 -5.78 -.27 10.5 -5.91 0 10.5 6.41 0
  [4,16,11.84,6.28,-.27,11.84,-5.78,-.27,10.5,-5.91,0,10.5,6.41,0],
// 4 16 9.5 6.5 0 10.5 6.41 0 10.5 -5.91 0 9.5 -6 0
  [4,16,9.5,6.5,0,10.5,6.41,0,10.5,-5.91,0,9.5,-6,0],
// 4 16 9.5 6.5 .5 9.5 -6 .5 10.5 -5.91 .5 10.5 6.41 .5
  [4,16,9.5,6.5,.5,9.5,-6,.5,10.5,-5.91,.5,10.5,6.41,.5],
// 4 16 12.03 6.28 .2 10.5 6.41 .5 10.5 -5.91 .5 12.03 -5.78 .2
  [4,16,12.03,6.28,.2,10.5,6.41,.5,10.5,-5.91,.5,12.03,-5.78,.2],
// 4 16 12.03 6.28 .2 12.03 -5.78 .2 13.33 -5.65 -.67 13.33 6.15 -.67
  [4,16,12.03,6.28,.2,12.03,-5.78,.2,13.33,-5.65,-.67,13.33,6.15,-.67],
// 4 16 14.2 6.01 -1.97 13.33 6.15 -.67 13.33 -5.65 -.67 14.2 -5.51 -1.97
  [4,16,14.2,6.01,-1.97,13.33,6.15,-.67,13.33,-5.65,-.67,14.2,-5.51,-1.97],
// 4 16 14.2 6.01 -1.97 14.2 -5.51 -1.97 14.5 -5.38 -3.5 14.5 5.88 -3.5
  [4,16,14.2,6.01,-1.97,14.2,-5.51,-1.97,14.5,-5.38,-3.5,14.5,5.88,-3.5],
// 4 16 14.5 -5.38 -3.5 14.2 -5.25 -5.03 14.2 5.75 -5.03 14.5 5.88 -3.5
  [4,16,14.5,-5.38,-3.5,14.2,-5.25,-5.03,14.2,5.75,-5.03,14.5,5.88,-3.5],
// 4 16 14.2 5.75 -5.03 14.2 -5.25 -5.03 13.33 -5.12 -6.33 13.33 5.62 -6.33
  [4,16,14.2,5.75,-5.03,14.2,-5.25,-5.03,13.33,-5.12,-6.33,13.33,5.62,-6.33],
// 4 16 12.03 5.48 -7.2 13.33 5.62 -6.33 13.33 -5.12 -6.33 12.03 -4.98 -7.2
  [4,16,12.03,5.48,-7.2,13.33,5.62,-6.33,13.33,-5.12,-6.33,12.03,-4.98,-7.2],
// 5 24 -.27 -3.91 -8.41 -.54 -3.91 -8.82 -.92 -3.86 -8.38 0 -3.96 -8.5
  [5,24,-.27,-3.91,-8.41,-.54,-3.91,-8.82,-.92,-3.86,-8.38,0,-3.96,-8.5],
// 5 24 0 -3.96 -9 0 -3.96 -8.5 12.03 -4.98 -7.2 -.54 -3.91 -8.82
  [5,24,0,-3.96,-9,0,-3.96,-8.5,12.03,-4.98,-7.2,-.54,-3.91,-8.82],
// 5 24 0 -3.96 -8.5 -.54 -3.91 -8.82 -.27 -3.91 -8.41 0 -3.96 -9
  [5,24,0,-3.96,-8.5,-.54,-3.91,-8.82,-.27,-3.91,-8.41,0,-3.96,-9],
// 5 24 -.27 -3.91 -8.41 -.92 -3.86 -8.38 -.46 -3.86 -8.19 -.54 -3.91 -8.82
  [5,24,-.27,-3.91,-8.41,-.92,-3.86,-8.38,-.46,-3.86,-8.19,-.54,-3.91,-8.82],
// 5 24 13.33 -5.65 -.67 13.33 6.15 -.67 14.2 -5.51 -1.97 12.03 6.28 .2
  [5,24,13.33,-5.65,-.67,13.33,6.15,-.67,14.2,-5.51,-1.97,12.03,6.28,.2],
// 5 24 14.2 -5.25 -5.03 14.2 5.75 -5.03 13.33 -5.12 -6.33 14.5 5.88 -3.5
  [5,24,14.2,-5.25,-5.03,14.2,5.75,-5.03,13.33,-5.12,-6.33,14.5,5.88,-3.5],
// 2 24 -1.11 4.25 -7.14 -1.11 -3.75 -7.14
  [2,24,-1.11,4.25,-7.14,-1.11,-3.75,-7.14],
// 5 24 14.5 -5.38 -3.5 14.5 5.88 -3.5 14.2 -5.25 -5.03 14.2 6.01 -1.97
  [5,24,14.5,-5.38,-3.5,14.5,5.88,-3.5,14.2,-5.25,-5.03,14.2,6.01,-1.97],
// 5 24 11.84 5.48 -6.73 12.03 5.48 -7.2 0 4.46 -9 12.97 5.62 -5.97
  [5,24,11.84,5.48,-6.73,12.03,5.48,-7.2,0,4.46,-9,12.97,5.62,-5.97],
// 5 24 -.27 -3.91 -8.41 -.27 4.41 -8.41 0 -3.96 -8.5 -.46 4.36 -8.19
  [5,24,-.27,-3.91,-8.41,-.27,4.41,-8.41,0,-3.96,-8.5,-.46,4.36,-8.19],
// 5 24 11.84 -4.98 -6.73 11.84 5.48 -6.73 0 4.46 -8.5 12.97 -5.12 -5.97
  [5,24,11.84,-4.98,-6.73,11.84,5.48,-6.73,0,4.46,-8.5,12.97,-5.12,-5.97],
// 5 24 14 -5.38 -3.5 14 5.88 -3.5 13.73 5.75 -4.84 13.73 -5.51 -2.16
  [5,24,14,-5.38,-3.5,14,5.88,-3.5,13.73,5.75,-4.84,13.73,-5.51,-2.16],
// 5 24 -.46 -3.86 -8.19 -.46 4.36 -8.19 -.27 -3.91 -8.41 -.63 4.25 -7.07
  [5,24,-.46,-3.86,-8.19,-.46,4.36,-8.19,-.27,-3.91,-8.41,-.63,4.25,-7.07],
// 5 24 13.33 -5.12 -6.33 12.97 -5.12 -5.97 11.84 -4.98 -6.73 14.2 -5.25 -5.03
  [5,24,13.33,-5.12,-6.33,12.97,-5.12,-5.97,11.84,-4.98,-6.73,14.2,-5.25,-5.03],
// 5 24 10.5 -5.91 0 10.5 -5.91 .5 11.84 -5.78 -.27 9.5 -6 .5
  [5,24,10.5,-5.91,0,10.5,-5.91,.5,11.84,-5.78,-.27,9.5,-6,.5],
// 5 24 -.46 -3.86 -8.19 -.92 -3.86 -8.38 -.63 -3.75 -7.07 -.27 -3.91 -8.41
  [5,24,-.46,-3.86,-8.19,-.92,-3.86,-8.38,-.63,-3.75,-7.07,-.27,-3.91,-8.41],
// 5 24 -.54 4.41 -8.82 0 4.46 -8.5 -.27 4.41 -8.41 0 4.46 -9
  [5,24,-.54,4.41,-8.82,0,4.46,-8.5,-.27,4.41,-8.41,0,4.46,-9],
// 5 24 11.84 -5.78 -.27 12.03 -5.78 .2 10.5 -5.91 .5 12.97 -5.65 -1.03
  [5,24,11.84,-5.78,-.27,12.03,-5.78,.2,10.5,-5.91,.5,12.97,-5.65,-1.03],
// 5 24 12.97 5.62 -5.97 13.33 5.62 -6.33 12.03 5.48 -7.2 13.73 5.75 -4.84
  [5,24,12.97,5.62,-5.97,13.33,5.62,-6.33,12.03,5.48,-7.2,13.73,5.75,-4.84],
// 5 24 12.03 -5.78 .2 12.03 6.28 .2 13.33 -5.65 -.67 10.5 6.41 .5
  [5,24,12.03,-5.78,.2,12.03,6.28,.2,13.33,-5.65,-.67,10.5,6.41,.5],
// 5 24 12.03 -4.98 -7.2 12.03 5.48 -7.2 0 -3.96 -9 13.33 5.62 -6.33
  [5,24,12.03,-4.98,-7.2,12.03,5.48,-7.2,0,-3.96,-9,13.33,5.62,-6.33],
// 5 24 0 4.46 -8.5 0 4.46 -9 -.54 4.41 -8.82 11.84 5.48 -6.73
  [5,24,0,4.46,-8.5,0,4.46,-9,-.54,4.41,-8.82,11.84,5.48,-6.73],
// 5 24 -.54 4.41 -8.82 -.27 4.41 -8.41 -.92 4.36 -8.38 0 4.46 -8.5
  [5,24,-.54,4.41,-8.82,-.27,4.41,-8.41,-.92,4.36,-8.38,0,4.46,-8.5],
// 5 24 14 5.88 -3.5 14.5 5.88 -3.5 13.73 6.01 -2.16 14.2 5.75 -5.03
  [5,24,14,5.88,-3.5,14.5,5.88,-3.5,13.73,6.01,-2.16,14.2,5.75,-5.03],
// 5 24 12.97 -5.65 -1.03 12.97 6.15 -1.03 11.84 -5.78 -.27 13.73 6.01 -2.16
  [5,24,12.97,-5.65,-1.03,12.97,6.15,-1.03,11.84,-5.78,-.27,13.73,6.01,-2.16],
// 5 24 12.97 -5.12 -5.97 12.97 5.62 -5.97 11.84 5.48 -6.73 13.73 -5.25 -4.84
  [5,24,12.97,-5.12,-5.97,12.97,5.62,-5.97,11.84,5.48,-6.73,13.73,-5.25,-4.84],
// 5 24 -.92 4.36 -8.38 -.27 4.41 -8.41 -.46 4.36 -8.19 -.54 4.41 -8.82
  [5,24,-.92,4.36,-8.38,-.27,4.41,-8.41,-.46,4.36,-8.19,-.54,4.41,-8.82],
// 5 24 11.84 -5.78 -.27 11.84 6.28 -.27 10.5 -5.91 0 12.97 6.15 -1.03
  [5,24,11.84,-5.78,-.27,11.84,6.28,-.27,10.5,-5.91,0,12.97,6.15,-1.03],
// 5 24 13.73 6.01 -2.16 14.2 6.01 -1.97 12.97 6.15 -1.03 14.5 5.88 -3.5
  [5,24,13.73,6.01,-2.16,14.2,6.01,-1.97,12.97,6.15,-1.03,14.5,5.88,-3.5],
// 5 24 -.92 4.36 -8.38 -.92 -3.86 -8.38 -.54 4.41 -8.82 -1.11 -3.75 -7.14
  [5,24,-.92,4.36,-8.38,-.92,-3.86,-8.38,-.54,4.41,-8.82,-1.11,-3.75,-7.14],
// 5 24 13.33 -5.12 -6.33 13.33 5.62 -6.33 12.03 -4.98 -7.2 14.2 5.75 -5.03
  [5,24,13.33,-5.12,-6.33,13.33,5.62,-6.33,12.03,-4.98,-7.2,14.2,5.75,-5.03],
// 5 24 -.92 4.36 -8.38 -.46 4.36 -8.19 -.27 4.41 -8.41 -1.11 4.25 -7.14
  [5,24,-.92,4.36,-8.38,-.46,4.36,-8.19,-.27,4.41,-8.41,-1.11,4.25,-7.14],
// 5 24 13.33 -5.65 -.67 12.97 -5.65 -1.03 13.73 -5.51 -2.16 12.03 -5.78 .2
  [5,24,13.33,-5.65,-.67,12.97,-5.65,-1.03,13.73,-5.51,-2.16,12.03,-5.78,.2],
// 5 24 14.2 -5.51 -1.97 14.2 6.01 -1.97 13.33 6.15 -.67 14.5 -5.38 -3.5
  [5,24,14.2,-5.51,-1.97,14.2,6.01,-1.97,13.33,6.15,-.67,14.5,-5.38,-3.5],
// 5 24 0 4.46 -9 0 -3.96 -9 -.54 -3.91 -8.82 12.03 5.48 -7.2
  [5,24,0,4.46,-9,0,-3.96,-9,-.54,-3.91,-8.82,12.03,5.48,-7.2],
// 5 24 14.5 -5.38 -3.5 14 -5.38 -3.5 14.2 -5.51 -1.97 13.73 -5.25 -4.84
  [5,24,14.5,-5.38,-3.5,14,-5.38,-3.5,14.2,-5.51,-1.97,13.73,-5.25,-4.84],
// 5 24 13.73 5.75 -4.84 14.2 5.75 -5.03 14 5.88 -3.5 13.33 5.62 -6.33
  [5,24,13.73,5.75,-4.84,14.2,5.75,-5.03,14,5.88,-3.5,13.33,5.62,-6.33],
// 5 24 10.5 -5.91 .5 10.5 6.41 .5 12.03 -5.78 .2 9.5 6.5 .5
  [5,24,10.5,-5.91,.5,10.5,6.41,.5,12.03,-5.78,.2,9.5,6.5,.5],
// 2 24 -.63 -3.75 -7.07 -.63 4.25 -7.07
  [2,24,-.63,-3.75,-7.07,-.63,4.25,-7.07],
// 5 24 -.54 4.41 -8.82 -.54 -3.91 -8.82 0 4.46 -9 -.92 -3.86 -8.38
  [5,24,-.54,4.41,-8.82,-.54,-3.91,-8.82,0,4.46,-9,-.92,-3.86,-8.38],
// 5 24 12.97 6.15 -1.03 13.33 6.15 -.67 14.2 6.01 -1.97 11.84 6.28 -.27
  [5,24,12.97,6.15,-1.03,13.33,6.15,-.67,14.2,6.01,-1.97,11.84,6.28,-.27],
// 5 24 12.03 6.28 .2 11.84 6.28 -.27 13.33 6.15 -.67 10.5 6.41 0
  [5,24,12.03,6.28,.2,11.84,6.28,-.27,13.33,6.15,-.67,10.5,6.41,0],
// 5 24 10.5 -5.91 0 10.5 6.41 0 9.5 -6 0 11.84 6.28 -.27
  [5,24,10.5,-5.91,0,10.5,6.41,0,9.5,-6,0,11.84,6.28,-.27],
// 5 24 14.2 -5.51 -1.97 13.73 -5.51 -2.16 13.33 -5.65 -.67 14 -5.38 -3.5
  [5,24,14.2,-5.51,-1.97,13.73,-5.51,-2.16,13.33,-5.65,-.67,14,-5.38,-3.5],
// 5 24 0 -3.96 -8.5 0 4.46 -8.5 11.84 -4.98 -6.73 -.27 4.41 -8.41
  [5,24,0,-3.96,-8.5,0,4.46,-8.5,11.84,-4.98,-6.73,-.27,4.41,-8.41],
// 5 24 14.2 -5.25 -5.03 13.73 -5.25 -4.84 14.5 -5.38 -3.5 12.97 -5.12 -5.97
  [5,24,14.2,-5.25,-5.03,13.73,-5.25,-4.84,14.5,-5.38,-3.5,12.97,-5.12,-5.97],
// 5 24 13.73 -5.25 -4.84 13.73 5.75 -4.84 14 -5.38 -3.5 12.97 5.62 -5.97
  [5,24,13.73,-5.25,-4.84,13.73,5.75,-4.84,14,-5.38,-3.5,12.97,5.62,-5.97],
// 5 24 13.73 6.01 -2.16 13.73 -5.51 -2.16 14 5.88 -3.5 12.97 -5.65 -1.03
  [5,24,13.73,6.01,-2.16,13.73,-5.51,-2.16,14,5.88,-3.5,12.97,-5.65,-1.03],
// 4 16 -8.5 7.5 0 -4 2 0 -4 -2 0 -8.5 -7.5 0
  [4,16,-8.5,7.5,0,-4,2,0,-4,-2,0,-8.5,-7.5,0],
// 4 16 -8.5 -7.5 .5 -4 -2 .5 -4 2 .5 -8.5 7.5 .5
  [4,16,-8.5,-7.5,.5,-4,-2,.5,-4,2,.5,-8.5,7.5,.5],
// 4 16 0 2 0 -4 2 0 -8.5 7.5 0 -3.5 10 0
  [4,16,0,2,0,-4,2,0,-8.5,7.5,0,-3.5,10,0],
// 4 16 0 2 0 -3.5 10 0 9.5 10 0 9.5 6.5 0
  [4,16,0,2,0,-3.5,10,0,9.5,10,0,9.5,6.5,0],
// 4 16 9.5 -6 0 0 -2 0 0 2 0 9.5 6.5 0
  [4,16,9.5,-6,0,0,-2,0,0,2,0,9.5,6.5,0],
// 4 16 0 -2 0 9.5 -6 0 9.5 -10 0 -4 -2 0
  [4,16,0,-2,0,9.5,-6,0,9.5,-10,0,-4,-2,0],
// 4 16 -4 -2 0 9.5 -10 0 -3.5 -10 0 -8.5 -7.5 0
  [4,16,-4,-2,0,9.5,-10,0,-3.5,-10,0,-8.5,-7.5,0],
// 4 16 -8.5 7.5 .5 -4 2 .5 0 2 .5 -3.5 10 .5
  [4,16,-8.5,7.5,.5,-4,2,.5,0,2,.5,-3.5,10,.5],
// 4 16 9.5 10 .5 -3.5 10 .5 0 2 .5 9.5 6.5 .5
  [4,16,9.5,10,.5,-3.5,10,.5,0,2,.5,9.5,6.5,.5],
// 4 16 0 2 .5 0 -2 .5 9.5 -6 .5 9.5 6.5 .5
  [4,16,0,2,.5,0,-2,.5,9.5,-6,.5,9.5,6.5,.5],
// 4 16 9.5 -10 .5 9.5 -6 .5 0 -2 .5 -4 -2 .5
  [4,16,9.5,-10,.5,9.5,-6,.5,0,-2,.5,-4,-2,.5],
// 4 16 -3.5 -10 .5 9.5 -10 .5 -4 -2 .5 -8.5 -7.5 .5
  [4,16,-3.5,-10,.5,9.5,-10,.5,-4,-2,.5,-8.5,-7.5,.5],
];
module ldraw_lib__u9642(step=0, col=false, unit=2/5, alt=false, line=0.2, solid=!$preview)
    makepoly(ldraw_lib__u9642(), step=step, col=col, unit=unit, alt=alt, line=line, solid=solid);
ldraw_lib__u9642(line=0.2);
